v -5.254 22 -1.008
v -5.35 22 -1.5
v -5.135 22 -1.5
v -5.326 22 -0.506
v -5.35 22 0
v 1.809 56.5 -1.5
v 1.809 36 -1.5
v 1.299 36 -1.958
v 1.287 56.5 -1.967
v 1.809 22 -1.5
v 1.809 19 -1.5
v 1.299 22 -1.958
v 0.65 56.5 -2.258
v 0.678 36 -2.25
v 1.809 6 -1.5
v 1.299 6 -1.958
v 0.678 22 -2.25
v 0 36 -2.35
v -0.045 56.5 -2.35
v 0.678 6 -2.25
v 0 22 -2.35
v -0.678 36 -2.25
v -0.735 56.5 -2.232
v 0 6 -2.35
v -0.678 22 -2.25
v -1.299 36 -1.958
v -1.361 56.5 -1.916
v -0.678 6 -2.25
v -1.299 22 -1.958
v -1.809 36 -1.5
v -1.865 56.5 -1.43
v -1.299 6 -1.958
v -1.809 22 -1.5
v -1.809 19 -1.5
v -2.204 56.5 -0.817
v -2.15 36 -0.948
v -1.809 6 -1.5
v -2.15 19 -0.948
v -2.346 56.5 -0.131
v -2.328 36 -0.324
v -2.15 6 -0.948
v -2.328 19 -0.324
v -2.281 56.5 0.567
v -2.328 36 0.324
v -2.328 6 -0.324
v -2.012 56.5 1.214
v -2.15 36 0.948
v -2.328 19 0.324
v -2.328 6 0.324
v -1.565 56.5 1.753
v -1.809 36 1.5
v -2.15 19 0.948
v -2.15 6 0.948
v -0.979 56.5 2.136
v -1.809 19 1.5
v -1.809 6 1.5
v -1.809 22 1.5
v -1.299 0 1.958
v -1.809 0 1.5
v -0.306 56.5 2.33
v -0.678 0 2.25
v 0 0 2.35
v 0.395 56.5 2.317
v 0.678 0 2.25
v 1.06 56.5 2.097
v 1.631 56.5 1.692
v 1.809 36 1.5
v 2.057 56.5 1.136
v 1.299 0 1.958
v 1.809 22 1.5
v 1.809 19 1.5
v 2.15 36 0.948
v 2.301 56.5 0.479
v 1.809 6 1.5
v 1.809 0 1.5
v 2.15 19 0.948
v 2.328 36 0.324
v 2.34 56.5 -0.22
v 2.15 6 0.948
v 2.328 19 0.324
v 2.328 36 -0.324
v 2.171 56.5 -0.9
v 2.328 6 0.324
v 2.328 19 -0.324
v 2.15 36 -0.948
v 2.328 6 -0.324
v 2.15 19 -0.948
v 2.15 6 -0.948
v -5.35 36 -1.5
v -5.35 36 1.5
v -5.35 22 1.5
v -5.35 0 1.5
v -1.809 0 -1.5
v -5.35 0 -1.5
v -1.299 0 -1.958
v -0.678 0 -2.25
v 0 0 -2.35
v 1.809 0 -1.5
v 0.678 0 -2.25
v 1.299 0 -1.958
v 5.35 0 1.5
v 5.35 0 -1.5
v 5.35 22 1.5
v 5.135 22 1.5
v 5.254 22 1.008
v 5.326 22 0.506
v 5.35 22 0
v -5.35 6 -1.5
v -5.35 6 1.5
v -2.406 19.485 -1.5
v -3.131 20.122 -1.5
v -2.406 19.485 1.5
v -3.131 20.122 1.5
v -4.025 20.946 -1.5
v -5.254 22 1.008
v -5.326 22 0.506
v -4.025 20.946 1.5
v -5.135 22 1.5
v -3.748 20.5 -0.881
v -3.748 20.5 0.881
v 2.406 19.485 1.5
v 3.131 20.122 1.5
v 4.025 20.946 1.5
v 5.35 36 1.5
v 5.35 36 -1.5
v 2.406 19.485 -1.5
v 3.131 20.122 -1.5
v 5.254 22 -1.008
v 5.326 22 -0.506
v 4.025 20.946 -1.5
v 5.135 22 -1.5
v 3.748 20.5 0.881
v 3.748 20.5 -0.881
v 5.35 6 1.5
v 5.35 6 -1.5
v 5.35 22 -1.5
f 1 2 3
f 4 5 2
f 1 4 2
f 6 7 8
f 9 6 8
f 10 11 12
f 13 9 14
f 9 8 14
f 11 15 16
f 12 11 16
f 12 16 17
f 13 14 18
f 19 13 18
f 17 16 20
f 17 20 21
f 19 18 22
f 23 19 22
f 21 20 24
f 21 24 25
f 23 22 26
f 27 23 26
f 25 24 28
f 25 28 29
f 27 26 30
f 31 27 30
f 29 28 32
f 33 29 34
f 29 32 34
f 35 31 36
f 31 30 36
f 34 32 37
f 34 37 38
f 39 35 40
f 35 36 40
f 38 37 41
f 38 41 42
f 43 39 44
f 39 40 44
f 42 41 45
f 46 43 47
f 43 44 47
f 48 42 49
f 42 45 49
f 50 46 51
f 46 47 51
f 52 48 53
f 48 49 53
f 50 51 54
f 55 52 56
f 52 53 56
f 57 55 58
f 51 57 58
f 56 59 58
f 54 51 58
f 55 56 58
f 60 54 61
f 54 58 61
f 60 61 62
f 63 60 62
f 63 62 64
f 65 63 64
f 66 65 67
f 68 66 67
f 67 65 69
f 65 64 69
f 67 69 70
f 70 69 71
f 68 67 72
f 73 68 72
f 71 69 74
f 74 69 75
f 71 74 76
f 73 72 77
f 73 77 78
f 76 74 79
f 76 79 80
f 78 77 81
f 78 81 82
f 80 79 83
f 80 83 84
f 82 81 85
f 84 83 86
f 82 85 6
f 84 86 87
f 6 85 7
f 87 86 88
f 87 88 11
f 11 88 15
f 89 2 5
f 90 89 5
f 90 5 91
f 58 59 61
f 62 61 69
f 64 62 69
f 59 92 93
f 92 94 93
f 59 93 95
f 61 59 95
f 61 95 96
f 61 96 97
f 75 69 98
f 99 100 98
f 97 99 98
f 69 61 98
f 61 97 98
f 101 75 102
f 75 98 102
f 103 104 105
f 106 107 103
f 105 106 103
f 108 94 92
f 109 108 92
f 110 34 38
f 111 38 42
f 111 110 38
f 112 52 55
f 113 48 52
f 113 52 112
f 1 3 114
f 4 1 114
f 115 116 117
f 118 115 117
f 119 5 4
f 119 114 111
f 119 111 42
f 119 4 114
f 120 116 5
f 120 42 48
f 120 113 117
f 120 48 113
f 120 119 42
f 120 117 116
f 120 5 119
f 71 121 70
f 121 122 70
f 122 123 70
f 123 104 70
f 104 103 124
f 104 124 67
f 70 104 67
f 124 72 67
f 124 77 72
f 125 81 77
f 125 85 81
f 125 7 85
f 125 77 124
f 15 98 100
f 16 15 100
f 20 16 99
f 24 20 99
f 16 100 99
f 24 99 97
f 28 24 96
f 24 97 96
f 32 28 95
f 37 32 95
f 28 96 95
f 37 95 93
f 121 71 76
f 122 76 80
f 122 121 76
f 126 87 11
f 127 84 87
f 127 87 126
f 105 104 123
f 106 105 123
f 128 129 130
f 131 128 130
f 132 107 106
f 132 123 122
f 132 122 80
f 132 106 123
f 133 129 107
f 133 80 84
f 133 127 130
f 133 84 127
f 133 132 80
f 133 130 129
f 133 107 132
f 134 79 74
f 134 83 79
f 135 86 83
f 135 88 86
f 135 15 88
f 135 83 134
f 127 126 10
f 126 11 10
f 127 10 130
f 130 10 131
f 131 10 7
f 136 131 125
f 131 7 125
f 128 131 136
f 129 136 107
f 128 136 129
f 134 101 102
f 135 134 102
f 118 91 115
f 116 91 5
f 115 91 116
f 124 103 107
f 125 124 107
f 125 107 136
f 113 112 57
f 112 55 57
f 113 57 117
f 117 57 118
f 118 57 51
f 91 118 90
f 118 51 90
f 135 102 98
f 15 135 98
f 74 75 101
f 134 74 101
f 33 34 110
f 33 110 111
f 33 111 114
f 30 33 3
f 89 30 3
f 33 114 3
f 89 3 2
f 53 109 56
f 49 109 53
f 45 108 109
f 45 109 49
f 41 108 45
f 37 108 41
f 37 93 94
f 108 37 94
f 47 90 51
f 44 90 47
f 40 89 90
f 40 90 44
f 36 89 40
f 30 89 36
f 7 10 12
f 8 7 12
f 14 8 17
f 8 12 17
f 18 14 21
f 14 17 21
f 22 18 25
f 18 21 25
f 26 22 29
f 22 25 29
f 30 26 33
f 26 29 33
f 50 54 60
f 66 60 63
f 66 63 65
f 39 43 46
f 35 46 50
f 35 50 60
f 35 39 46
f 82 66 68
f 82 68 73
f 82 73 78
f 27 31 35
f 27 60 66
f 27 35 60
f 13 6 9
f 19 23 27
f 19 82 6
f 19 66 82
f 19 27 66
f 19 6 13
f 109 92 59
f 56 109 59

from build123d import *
from build123d.topology import SkipClean

# Parameters (mm, degrees)
SKETCH1_R           = 2.35
BOSS_EXTRUDE1_DEPTH = 6
SKETCH2_R           = 2.35
BOSS_EXTRUDE2_DEPTH = 16
BOSS_EXTRUDE3_START = 22
SKETCH1_2_R         = 2.35
BOSS_EXTRUDE3_DEPTH = 14
BOSS_EXTRUDE4_START = 30
SKETCH2_2_R         = 2.35
BOSS_EXTRUDE4_DEPTH = 20.5
CHAMFER1_SIZE       = 3


with BuildPart() as part:
    # Sketch1 → Boss-Extrude1 (new body)
    with BuildSketch(Plane(origin=(0, 0, 0), x_dir=(1, 0, 0), z_dir=(0, 1, 0))):
        with BuildLine():
            Line((-5.35, -1.5), (-1.809005252, -1.5))
            ThreePointArc((-1.809005252, -1.5), (-2.35, 0), (-1.809005252, 1.5))
            Line((-1.809005252, 1.5), (-5.35, 1.5))
            Line((-5.35, 1.5), (-5.35, -1.5))
        make_face()
        Circle(SKETCH1_R)
        with BuildLine():
            ThreePointArc((2.35, 0), (2.210617826, -0.797288423), (1.809005252, -1.5))
            Line((1.809005252, -1.5), (5.35, -1.5))
            Line((5.35, -1.5), (5.35, 1.5))
            Line((5.35, 1.5), (1.809005252, 1.5))
            ThreePointArc((1.809005252, 1.5), (2.210617826, 0.797288423), (2.35, 0))
        make_face()
    extrude(amount=BOSS_EXTRUDE1_DEPTH)

    # Sketch2 → Boss-Extrude2 (add)
    with BuildSketch(Plane(origin=(0, 6, 0), x_dir=(1, 0, 0), z_dir=(0, 1, 0))):
        with Locations(Location((0, 0, 0), (0, 0, 39.665012908))):
            Circle(SKETCH2_R)
    extrude(amount=BOSS_EXTRUDE2_DEPTH)

    # Sketch1<2> → Boss-Extrude3 (add)
    with BuildSketch(Plane(origin=(0, 0, 0), x_dir=(1, 0, 0), z_dir=(0, 1, 0)).offset(BOSS_EXTRUDE3_START)):
        with BuildLine():
            Line((-5.35, -1.5), (-1.809005252, -1.5))
            ThreePointArc((-1.809005252, -1.5), (-2.35, 0), (-1.809005252, 1.5))
            Line((-1.809005252, 1.5), (-5.35, 1.5))
            Line((-5.35, 1.5), (-5.35, -1.5))
        make_face()
        with Locations(Location((0, 0, 0), (0, 0, 39.665012908))):
            Circle(SKETCH1_2_R)
        with BuildLine():
            ThreePointArc((2.35, 0), (2.210617826, -0.797288423), (1.809005252, -1.5))
            Line((1.809005252, -1.5), (5.35, -1.5))
            Line((5.35, -1.5), (5.35, 1.5))
            Line((5.35, 1.5), (1.809005252, 1.5))
            ThreePointArc((1.809005252, 1.5), (2.210617826, 0.797288423), (2.35, 0))
        make_face()
    extrude(amount=BOSS_EXTRUDE3_DEPTH)

    # Sketch2<2> → Boss-Extrude4 (add)
    with SkipClean():  # the faces are left unmerged after this step: merging them gives an invalid solid
        with BuildSketch(Plane(origin=(0, 6, 0), x_dir=(1, 0, 0), z_dir=(0, 1, 0)).offset(BOSS_EXTRUDE4_START)):
            with Locations(Location((0, 0, 0), (0, 0, 39.665012908))):
                Circle(SKETCH2_2_R)
        extrude(amount=BOSS_EXTRUDE4_DEPTH)

    # Chamfer1
    # the kernel refuses this chamfer: 3 mm, written as the material it adds along each edge
    with BuildSketch(Plane(origin=(0, 22, 0), x_dir=(-0.9999950652018471, 0, 0.003141587489430323), z_dir=(-0.003141587489430323, 0, -0.9999950652018471))) as chamfer1_piece_1_section:
        Polygon((2.35, -CHAMFER1_SIZE), (2.35 + CHAMFER1_SIZE, 0), (2.35, 0), align=None)
    chamfer1_piece_1 = revolve(axis=Axis((0, 22, 0), (0, 1, 0)), revolution_arc=359.64, mode=Mode.PRIVATE)
    chamfer1_piece_1 = split(chamfer1_piece_1, bisect_by=Plane(origin=(-3.19448265, 21.00212183, 1.5), z_dir=(0, 0, -1)), keep=Keep.TOP, mode=Mode.PRIVATE)
    chamfer1_piece_1 = split(chamfer1_piece_1, bisect_by=Plane(origin=(-3.19448265, 21.00212183, -1.5), z_dir=(0, 0, 1)), keep=Keep.TOP, mode=Mode.PRIVATE)
    chamfer1_piece_1 = split(chamfer1_piece_1, bisect_by=Plane(origin=(5.35, 21.00212183, 0.771950274), z_dir=(-1, 0, 0)), keep=Keep.TOP, mode=Mode.PRIVATE)
    add(chamfer1_piece_1)
    with BuildSketch(Plane(origin=(0, 22, 0), x_dir=(0.9999950652018581, 0, -0.0031415874858800653), z_dir=(0.0031415874858800653, 0, 0.9999950652018581))) as chamfer1_piece_2_section:
        Polygon((2.35, -CHAMFER1_SIZE), (2.35 + CHAMFER1_SIZE, 0), (2.35, 0), align=None)
    chamfer1_piece_2 = revolve(axis=Axis((0, 22, 0), (0, 1, 0)), revolution_arc=359.64, mode=Mode.PRIVATE)
    chamfer1_piece_2 = split(chamfer1_piece_2, bisect_by=Plane(origin=(3.19448265, 21.00212183, 1.5), z_dir=(0, 0, -1)), keep=Keep.TOP, mode=Mode.PRIVATE)
    chamfer1_piece_2 = split(chamfer1_piece_2, bisect_by=Plane(origin=(3.19448265, 21.00212183, -1.5), z_dir=(0, 0, 1)), keep=Keep.TOP, mode=Mode.PRIVATE)
    chamfer1_piece_2 = split(chamfer1_piece_2, bisect_by=Plane(origin=(-5.35, 21.00212183, -0.771950274), z_dir=(1, 0, 0)), keep=Keep.TOP, mode=Mode.PRIVATE)
    add(chamfer1_piece_2)


solid = part.part
